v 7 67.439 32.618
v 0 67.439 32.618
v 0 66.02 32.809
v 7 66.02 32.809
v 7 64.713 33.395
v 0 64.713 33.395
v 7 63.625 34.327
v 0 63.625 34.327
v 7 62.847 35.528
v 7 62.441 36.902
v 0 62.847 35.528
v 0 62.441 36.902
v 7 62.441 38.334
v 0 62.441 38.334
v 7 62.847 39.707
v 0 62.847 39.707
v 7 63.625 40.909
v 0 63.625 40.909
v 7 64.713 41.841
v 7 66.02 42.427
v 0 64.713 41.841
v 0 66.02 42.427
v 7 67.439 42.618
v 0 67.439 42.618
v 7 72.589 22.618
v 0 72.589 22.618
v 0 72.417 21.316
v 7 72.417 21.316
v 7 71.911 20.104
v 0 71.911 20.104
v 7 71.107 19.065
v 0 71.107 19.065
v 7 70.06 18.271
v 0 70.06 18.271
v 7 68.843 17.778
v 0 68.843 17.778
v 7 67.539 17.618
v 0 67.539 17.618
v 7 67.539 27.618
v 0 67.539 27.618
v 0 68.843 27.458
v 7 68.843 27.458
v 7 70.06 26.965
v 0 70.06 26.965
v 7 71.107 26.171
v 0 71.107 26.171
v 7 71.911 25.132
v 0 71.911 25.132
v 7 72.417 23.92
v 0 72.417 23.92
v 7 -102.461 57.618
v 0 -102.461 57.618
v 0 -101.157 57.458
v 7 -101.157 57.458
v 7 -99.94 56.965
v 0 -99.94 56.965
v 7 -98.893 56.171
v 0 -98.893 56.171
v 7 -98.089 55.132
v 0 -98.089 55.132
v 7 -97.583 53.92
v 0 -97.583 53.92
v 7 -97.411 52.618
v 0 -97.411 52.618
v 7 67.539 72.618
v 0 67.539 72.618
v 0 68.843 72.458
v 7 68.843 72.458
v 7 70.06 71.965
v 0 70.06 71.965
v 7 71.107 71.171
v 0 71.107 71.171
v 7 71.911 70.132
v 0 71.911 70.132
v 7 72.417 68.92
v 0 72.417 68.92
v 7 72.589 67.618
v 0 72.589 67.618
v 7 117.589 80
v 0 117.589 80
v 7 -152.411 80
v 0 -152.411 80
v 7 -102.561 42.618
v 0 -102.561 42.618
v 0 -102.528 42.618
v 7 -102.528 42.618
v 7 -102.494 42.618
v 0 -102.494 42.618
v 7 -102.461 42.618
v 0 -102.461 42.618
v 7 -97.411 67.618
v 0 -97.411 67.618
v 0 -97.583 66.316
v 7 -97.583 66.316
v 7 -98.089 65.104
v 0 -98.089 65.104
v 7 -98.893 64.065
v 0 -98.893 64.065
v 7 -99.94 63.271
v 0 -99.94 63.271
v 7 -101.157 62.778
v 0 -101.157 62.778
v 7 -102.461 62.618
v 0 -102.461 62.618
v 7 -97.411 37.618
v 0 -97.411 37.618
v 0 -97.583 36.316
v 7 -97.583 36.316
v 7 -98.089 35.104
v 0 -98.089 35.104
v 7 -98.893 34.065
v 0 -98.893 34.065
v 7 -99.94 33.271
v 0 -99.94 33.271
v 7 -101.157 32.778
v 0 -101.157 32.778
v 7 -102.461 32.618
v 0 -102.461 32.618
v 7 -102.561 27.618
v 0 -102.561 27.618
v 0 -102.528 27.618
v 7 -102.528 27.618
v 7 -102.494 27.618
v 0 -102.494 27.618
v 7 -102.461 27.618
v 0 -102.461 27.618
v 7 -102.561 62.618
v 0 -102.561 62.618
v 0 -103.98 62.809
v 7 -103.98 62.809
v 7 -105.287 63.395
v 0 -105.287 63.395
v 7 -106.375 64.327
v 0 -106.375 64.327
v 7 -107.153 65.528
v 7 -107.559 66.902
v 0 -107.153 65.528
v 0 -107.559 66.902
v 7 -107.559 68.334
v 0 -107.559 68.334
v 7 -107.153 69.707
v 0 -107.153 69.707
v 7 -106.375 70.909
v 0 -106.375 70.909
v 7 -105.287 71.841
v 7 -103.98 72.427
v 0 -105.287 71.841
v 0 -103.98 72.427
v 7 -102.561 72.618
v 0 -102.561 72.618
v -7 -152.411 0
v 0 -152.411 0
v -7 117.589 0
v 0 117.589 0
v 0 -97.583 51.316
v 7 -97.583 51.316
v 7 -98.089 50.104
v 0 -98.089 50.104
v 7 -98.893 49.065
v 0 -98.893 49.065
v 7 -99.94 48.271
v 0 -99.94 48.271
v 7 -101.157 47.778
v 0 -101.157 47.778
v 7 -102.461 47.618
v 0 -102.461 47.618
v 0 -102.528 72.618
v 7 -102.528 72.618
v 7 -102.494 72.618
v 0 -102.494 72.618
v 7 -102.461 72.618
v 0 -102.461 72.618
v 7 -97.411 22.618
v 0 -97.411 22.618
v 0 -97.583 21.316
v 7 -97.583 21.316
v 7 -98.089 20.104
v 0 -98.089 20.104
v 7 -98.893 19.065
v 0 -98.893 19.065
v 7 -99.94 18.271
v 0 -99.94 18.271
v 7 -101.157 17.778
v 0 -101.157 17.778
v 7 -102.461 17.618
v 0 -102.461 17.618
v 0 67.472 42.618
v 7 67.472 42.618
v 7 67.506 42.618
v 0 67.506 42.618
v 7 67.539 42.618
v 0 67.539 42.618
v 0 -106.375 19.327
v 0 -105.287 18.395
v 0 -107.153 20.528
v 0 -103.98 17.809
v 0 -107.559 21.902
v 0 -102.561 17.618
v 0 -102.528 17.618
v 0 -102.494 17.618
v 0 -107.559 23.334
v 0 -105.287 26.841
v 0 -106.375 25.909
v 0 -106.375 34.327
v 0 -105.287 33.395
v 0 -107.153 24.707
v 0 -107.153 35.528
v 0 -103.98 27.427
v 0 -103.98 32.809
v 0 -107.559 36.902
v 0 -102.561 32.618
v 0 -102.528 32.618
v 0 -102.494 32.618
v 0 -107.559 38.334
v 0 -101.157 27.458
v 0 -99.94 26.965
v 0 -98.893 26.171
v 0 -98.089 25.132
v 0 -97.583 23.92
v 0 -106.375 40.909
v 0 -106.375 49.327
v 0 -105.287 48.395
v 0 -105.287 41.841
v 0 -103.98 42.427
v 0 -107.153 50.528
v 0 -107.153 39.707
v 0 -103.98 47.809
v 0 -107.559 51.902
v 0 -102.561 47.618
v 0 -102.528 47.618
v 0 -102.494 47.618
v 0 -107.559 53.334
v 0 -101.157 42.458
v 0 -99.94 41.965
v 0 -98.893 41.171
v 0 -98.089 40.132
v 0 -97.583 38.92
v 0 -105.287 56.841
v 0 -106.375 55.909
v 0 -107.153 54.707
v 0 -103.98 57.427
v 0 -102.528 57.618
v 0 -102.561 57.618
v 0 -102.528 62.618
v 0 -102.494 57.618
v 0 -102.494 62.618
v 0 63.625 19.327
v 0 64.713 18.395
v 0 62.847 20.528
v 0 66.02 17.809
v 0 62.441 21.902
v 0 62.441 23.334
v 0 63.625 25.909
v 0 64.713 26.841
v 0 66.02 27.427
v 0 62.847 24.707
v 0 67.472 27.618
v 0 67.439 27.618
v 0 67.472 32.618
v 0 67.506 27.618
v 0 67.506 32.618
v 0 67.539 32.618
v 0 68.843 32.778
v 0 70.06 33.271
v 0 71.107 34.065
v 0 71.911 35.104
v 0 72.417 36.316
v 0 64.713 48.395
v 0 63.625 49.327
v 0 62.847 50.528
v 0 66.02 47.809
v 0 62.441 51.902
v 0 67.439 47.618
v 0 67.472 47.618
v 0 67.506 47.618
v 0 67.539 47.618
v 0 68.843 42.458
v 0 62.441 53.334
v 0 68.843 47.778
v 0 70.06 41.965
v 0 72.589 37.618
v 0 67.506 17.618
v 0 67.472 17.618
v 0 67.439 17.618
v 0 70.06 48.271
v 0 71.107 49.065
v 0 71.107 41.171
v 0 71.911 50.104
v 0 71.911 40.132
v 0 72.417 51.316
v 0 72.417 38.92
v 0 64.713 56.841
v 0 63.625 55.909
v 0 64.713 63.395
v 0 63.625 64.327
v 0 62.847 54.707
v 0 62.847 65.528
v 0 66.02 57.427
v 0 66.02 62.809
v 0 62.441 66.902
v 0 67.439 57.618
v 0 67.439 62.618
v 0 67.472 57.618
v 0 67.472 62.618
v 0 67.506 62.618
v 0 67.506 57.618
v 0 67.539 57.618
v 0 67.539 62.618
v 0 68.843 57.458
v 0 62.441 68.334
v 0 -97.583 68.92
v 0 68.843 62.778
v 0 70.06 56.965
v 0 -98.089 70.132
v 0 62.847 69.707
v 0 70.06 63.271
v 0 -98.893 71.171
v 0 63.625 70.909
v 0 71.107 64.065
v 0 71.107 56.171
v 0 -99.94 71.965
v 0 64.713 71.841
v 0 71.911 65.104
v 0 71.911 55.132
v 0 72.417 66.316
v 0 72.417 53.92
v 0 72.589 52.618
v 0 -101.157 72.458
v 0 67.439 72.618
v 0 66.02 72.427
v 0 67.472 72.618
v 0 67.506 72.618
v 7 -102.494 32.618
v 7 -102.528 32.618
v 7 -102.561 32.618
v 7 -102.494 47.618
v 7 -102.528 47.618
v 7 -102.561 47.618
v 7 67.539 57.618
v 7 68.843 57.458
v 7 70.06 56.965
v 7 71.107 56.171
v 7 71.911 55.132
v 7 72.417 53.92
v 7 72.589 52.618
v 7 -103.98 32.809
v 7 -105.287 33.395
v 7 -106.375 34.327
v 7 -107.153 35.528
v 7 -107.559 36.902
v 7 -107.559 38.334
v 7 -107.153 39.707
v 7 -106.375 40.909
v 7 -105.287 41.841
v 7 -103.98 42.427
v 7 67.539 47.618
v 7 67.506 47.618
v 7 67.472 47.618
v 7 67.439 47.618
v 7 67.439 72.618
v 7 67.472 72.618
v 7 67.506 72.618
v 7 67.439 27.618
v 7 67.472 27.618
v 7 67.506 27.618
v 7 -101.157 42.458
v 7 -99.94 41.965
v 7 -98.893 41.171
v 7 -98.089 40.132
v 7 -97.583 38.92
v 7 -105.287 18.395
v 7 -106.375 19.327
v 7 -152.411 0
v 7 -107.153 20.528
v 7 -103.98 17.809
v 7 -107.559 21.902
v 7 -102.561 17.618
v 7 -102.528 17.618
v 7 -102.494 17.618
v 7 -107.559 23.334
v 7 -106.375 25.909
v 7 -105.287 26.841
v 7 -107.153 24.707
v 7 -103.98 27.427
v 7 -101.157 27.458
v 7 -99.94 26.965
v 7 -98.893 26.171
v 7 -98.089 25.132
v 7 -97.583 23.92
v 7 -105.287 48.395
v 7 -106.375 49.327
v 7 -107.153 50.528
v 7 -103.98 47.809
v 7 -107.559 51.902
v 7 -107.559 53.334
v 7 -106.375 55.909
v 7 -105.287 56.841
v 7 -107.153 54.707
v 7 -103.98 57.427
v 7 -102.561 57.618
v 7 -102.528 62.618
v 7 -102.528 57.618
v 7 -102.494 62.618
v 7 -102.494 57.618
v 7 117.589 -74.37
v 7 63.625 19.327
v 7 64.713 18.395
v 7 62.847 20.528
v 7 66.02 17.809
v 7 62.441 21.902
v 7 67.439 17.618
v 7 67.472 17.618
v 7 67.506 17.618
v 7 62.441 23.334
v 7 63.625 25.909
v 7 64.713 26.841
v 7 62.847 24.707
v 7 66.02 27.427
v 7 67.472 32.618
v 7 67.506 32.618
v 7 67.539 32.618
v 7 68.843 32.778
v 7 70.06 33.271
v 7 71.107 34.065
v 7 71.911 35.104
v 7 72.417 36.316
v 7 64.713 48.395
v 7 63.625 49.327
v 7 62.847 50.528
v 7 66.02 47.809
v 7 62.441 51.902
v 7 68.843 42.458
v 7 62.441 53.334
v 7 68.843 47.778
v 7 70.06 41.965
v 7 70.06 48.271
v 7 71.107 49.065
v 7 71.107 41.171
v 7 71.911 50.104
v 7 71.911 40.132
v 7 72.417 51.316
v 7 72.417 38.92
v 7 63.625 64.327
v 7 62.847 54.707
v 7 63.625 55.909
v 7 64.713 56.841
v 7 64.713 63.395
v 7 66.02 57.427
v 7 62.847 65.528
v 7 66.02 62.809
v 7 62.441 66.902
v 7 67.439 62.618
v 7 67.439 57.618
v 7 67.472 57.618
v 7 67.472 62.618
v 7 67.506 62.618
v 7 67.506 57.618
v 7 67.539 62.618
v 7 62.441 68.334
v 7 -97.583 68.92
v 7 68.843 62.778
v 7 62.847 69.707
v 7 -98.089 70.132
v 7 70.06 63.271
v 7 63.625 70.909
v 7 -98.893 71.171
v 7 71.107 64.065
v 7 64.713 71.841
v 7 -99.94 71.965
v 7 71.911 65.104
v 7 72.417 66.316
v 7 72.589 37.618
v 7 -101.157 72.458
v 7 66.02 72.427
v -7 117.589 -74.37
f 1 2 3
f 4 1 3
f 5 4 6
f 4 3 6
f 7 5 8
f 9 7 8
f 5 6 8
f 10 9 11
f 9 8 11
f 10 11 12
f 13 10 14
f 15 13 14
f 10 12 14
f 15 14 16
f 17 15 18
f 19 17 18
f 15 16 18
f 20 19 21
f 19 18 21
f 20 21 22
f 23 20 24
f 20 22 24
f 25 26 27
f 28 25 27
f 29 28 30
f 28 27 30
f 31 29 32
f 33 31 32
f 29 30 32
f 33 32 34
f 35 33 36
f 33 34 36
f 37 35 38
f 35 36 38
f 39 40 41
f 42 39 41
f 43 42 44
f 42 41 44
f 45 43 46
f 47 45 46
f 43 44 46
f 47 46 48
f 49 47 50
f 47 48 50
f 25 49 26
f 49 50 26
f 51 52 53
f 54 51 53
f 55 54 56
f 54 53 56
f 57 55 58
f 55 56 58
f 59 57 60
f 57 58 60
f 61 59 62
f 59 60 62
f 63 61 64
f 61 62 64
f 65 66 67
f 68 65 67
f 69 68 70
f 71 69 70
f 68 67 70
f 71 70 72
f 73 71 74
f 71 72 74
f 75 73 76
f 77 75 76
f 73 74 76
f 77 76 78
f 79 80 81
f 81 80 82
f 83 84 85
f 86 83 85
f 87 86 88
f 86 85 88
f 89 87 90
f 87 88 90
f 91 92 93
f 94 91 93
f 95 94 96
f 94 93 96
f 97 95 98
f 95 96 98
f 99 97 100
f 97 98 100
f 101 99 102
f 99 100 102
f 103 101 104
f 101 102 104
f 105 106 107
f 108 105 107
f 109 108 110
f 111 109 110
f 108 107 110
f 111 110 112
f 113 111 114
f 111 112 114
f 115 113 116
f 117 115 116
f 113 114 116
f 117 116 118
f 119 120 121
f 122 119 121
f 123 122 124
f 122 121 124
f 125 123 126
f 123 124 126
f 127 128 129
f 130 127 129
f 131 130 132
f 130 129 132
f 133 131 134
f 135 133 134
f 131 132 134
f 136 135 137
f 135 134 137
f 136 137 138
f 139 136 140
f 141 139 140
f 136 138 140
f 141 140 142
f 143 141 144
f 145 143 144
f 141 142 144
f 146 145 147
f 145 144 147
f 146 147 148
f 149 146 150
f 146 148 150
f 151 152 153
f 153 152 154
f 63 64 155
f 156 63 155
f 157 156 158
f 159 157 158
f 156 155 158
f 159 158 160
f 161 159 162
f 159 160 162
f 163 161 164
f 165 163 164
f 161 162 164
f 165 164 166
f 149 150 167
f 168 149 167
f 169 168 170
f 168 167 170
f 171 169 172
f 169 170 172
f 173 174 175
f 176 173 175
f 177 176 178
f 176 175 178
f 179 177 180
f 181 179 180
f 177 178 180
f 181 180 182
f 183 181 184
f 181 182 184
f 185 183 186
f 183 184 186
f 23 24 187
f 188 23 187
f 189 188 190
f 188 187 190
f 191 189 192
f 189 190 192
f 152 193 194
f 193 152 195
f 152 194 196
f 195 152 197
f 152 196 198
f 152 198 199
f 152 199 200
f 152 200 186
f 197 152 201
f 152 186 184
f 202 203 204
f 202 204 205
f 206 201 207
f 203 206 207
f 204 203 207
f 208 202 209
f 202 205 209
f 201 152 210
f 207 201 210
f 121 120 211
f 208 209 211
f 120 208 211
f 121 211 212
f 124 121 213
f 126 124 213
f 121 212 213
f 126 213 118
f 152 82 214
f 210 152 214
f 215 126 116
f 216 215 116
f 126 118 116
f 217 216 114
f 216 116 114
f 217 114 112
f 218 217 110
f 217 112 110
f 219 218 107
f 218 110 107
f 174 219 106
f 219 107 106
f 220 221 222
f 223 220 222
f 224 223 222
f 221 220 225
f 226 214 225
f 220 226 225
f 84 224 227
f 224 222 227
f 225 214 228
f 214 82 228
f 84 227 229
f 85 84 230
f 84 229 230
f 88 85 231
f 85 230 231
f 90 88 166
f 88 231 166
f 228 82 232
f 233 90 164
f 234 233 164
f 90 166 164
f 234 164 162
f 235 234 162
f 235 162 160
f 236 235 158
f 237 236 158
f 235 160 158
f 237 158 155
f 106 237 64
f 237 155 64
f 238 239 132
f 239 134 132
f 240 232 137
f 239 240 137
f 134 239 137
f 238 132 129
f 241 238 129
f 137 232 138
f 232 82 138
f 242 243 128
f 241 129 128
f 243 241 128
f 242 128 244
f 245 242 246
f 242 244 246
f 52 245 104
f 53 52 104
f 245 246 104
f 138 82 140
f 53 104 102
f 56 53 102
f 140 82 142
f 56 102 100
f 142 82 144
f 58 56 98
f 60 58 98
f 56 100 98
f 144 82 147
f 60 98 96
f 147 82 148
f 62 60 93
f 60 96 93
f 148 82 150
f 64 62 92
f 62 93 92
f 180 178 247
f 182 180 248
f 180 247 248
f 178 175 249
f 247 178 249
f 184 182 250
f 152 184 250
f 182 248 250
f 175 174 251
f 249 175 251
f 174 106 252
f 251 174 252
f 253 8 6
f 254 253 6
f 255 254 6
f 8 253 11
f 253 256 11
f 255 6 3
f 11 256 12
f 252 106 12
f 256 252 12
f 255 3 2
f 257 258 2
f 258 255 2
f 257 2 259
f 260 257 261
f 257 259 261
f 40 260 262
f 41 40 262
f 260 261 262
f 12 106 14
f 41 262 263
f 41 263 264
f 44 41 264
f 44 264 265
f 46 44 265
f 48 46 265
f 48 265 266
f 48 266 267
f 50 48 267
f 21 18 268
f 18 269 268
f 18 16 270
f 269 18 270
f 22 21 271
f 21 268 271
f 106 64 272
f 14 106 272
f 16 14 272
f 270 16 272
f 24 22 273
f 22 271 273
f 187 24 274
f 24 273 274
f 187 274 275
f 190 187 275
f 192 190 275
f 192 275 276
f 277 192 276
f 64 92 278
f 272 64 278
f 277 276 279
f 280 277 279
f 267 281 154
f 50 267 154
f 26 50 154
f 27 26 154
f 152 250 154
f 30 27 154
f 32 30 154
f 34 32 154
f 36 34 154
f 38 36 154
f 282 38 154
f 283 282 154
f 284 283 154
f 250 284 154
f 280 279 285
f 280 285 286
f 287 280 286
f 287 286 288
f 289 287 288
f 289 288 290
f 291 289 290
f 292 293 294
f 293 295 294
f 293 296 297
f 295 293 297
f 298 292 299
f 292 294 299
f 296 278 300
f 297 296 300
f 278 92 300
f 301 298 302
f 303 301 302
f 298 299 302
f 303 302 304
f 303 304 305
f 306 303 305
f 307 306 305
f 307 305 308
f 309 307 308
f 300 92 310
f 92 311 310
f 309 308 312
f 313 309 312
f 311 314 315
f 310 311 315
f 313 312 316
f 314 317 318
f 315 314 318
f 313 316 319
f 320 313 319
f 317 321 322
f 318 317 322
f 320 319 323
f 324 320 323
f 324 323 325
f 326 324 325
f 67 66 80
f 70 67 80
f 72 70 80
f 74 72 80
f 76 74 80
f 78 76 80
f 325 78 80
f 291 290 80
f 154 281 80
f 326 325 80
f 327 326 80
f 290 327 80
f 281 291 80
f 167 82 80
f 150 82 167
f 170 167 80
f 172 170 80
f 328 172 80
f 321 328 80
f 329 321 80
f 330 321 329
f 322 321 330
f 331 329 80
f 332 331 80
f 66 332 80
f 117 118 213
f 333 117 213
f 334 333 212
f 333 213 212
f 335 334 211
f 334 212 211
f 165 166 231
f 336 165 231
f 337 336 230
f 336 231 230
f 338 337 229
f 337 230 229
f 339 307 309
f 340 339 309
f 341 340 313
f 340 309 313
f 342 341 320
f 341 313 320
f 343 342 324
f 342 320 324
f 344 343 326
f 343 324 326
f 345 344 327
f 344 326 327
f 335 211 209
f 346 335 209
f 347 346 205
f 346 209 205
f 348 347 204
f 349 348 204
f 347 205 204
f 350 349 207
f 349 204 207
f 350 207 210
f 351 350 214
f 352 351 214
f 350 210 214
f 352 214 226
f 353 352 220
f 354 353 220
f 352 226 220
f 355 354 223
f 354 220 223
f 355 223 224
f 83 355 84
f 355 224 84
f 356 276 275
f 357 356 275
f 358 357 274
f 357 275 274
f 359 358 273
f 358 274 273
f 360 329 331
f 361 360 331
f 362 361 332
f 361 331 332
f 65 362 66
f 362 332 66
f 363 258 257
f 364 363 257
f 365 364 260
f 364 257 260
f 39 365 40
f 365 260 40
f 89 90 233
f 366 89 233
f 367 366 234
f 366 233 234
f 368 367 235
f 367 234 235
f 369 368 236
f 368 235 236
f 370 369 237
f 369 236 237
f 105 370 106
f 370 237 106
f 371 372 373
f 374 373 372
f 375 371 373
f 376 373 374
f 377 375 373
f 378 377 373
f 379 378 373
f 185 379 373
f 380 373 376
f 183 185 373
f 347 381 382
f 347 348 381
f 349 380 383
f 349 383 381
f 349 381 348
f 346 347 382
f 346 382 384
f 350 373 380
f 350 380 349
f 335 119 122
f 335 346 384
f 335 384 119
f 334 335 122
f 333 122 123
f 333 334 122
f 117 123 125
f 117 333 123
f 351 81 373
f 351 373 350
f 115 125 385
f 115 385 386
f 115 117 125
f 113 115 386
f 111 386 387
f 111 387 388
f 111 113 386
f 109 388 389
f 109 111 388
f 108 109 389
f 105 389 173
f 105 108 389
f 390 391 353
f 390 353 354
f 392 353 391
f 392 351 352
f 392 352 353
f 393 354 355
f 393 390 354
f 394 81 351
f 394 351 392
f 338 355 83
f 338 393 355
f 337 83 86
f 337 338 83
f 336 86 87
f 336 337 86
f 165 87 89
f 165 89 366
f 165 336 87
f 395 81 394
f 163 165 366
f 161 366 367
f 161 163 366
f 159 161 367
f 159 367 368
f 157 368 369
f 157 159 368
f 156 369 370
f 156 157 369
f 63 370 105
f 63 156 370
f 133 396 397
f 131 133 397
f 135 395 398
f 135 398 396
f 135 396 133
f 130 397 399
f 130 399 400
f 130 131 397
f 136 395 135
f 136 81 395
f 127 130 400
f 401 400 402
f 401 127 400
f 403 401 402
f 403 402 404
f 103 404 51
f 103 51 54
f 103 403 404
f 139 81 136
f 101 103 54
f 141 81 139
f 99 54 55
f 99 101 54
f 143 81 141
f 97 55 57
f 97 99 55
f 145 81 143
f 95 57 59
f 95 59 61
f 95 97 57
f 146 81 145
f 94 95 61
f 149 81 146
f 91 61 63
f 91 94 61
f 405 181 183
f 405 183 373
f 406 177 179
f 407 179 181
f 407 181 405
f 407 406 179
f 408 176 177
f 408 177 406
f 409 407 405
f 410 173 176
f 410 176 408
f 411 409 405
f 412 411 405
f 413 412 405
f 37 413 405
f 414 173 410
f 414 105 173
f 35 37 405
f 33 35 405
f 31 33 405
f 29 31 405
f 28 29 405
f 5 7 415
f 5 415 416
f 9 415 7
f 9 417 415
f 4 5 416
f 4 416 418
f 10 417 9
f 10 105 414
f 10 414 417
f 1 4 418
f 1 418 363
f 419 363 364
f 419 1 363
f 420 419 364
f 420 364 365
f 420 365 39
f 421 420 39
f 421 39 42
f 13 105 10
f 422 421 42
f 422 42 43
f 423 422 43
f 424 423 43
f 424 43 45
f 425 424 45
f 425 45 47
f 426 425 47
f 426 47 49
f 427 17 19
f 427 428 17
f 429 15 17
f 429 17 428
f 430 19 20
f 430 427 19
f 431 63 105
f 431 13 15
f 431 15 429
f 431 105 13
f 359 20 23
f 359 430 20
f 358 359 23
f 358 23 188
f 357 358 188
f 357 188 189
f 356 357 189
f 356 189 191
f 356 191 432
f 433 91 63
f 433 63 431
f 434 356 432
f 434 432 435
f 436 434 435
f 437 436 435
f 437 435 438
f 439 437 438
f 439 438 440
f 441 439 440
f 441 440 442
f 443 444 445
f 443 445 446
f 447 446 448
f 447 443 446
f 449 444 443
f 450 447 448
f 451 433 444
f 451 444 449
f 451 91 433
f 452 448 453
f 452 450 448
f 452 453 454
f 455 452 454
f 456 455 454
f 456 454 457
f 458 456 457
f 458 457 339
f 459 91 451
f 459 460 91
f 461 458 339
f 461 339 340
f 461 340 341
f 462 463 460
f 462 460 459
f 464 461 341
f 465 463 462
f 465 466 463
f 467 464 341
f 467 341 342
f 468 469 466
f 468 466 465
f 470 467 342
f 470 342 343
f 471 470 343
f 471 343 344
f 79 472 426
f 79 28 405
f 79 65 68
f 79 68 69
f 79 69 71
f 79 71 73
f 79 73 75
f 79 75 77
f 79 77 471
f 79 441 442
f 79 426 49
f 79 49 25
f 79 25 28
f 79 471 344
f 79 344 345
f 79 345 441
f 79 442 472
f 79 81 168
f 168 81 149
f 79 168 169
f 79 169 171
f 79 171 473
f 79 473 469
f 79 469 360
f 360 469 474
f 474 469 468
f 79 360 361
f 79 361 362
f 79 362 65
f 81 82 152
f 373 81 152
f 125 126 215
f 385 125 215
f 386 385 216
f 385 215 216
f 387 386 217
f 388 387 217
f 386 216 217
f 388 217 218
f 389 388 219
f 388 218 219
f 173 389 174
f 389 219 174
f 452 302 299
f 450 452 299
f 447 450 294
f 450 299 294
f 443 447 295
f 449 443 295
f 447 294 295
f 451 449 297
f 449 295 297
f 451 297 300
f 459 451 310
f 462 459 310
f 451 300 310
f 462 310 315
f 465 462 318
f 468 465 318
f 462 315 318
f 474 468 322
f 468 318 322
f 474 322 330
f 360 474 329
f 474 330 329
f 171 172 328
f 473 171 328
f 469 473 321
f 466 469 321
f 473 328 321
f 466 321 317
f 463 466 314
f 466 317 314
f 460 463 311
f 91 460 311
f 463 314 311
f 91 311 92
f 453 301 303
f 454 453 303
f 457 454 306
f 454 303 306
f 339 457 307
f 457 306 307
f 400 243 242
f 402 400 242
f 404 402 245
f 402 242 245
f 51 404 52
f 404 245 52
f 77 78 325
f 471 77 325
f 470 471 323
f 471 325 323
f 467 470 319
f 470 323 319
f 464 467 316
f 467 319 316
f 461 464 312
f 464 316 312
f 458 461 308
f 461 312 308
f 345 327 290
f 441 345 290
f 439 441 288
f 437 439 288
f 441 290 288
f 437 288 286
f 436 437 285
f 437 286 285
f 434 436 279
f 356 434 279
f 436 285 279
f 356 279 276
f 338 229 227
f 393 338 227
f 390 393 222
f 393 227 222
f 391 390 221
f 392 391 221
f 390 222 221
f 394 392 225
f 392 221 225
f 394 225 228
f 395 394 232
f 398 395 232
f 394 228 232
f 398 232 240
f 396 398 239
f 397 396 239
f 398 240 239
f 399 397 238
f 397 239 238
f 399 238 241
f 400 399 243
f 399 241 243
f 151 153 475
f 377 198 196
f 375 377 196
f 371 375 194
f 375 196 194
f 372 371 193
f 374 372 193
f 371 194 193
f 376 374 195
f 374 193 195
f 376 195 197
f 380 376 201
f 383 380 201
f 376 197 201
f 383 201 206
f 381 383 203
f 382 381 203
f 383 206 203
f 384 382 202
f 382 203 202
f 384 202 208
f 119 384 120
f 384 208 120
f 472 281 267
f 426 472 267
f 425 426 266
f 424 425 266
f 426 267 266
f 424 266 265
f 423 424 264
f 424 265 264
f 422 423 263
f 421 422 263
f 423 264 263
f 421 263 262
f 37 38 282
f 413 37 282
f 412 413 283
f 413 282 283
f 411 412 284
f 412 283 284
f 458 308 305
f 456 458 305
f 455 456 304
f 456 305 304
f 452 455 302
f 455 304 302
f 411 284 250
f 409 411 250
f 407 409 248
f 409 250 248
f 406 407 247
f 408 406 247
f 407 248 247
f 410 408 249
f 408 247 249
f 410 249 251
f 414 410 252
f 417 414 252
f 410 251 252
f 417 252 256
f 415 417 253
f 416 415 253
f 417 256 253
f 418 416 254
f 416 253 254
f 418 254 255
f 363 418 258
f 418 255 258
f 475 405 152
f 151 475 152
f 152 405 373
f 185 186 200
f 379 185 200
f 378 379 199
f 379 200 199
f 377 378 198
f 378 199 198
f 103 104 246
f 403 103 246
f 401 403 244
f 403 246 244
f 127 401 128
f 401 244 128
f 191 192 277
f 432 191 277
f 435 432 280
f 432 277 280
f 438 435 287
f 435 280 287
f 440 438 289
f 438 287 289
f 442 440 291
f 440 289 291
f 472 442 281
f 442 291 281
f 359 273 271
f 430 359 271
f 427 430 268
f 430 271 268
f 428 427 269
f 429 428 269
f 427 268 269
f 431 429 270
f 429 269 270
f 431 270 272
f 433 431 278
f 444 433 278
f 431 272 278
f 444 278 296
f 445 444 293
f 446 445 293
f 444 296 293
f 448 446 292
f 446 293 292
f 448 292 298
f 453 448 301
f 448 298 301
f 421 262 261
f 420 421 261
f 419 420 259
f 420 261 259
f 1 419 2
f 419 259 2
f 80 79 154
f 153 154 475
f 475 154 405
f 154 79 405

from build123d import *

# Parameters (mm, degrees)
F1_DEPTH = 7
F3_DEPTH = 7


# Not quite as in the source:
# - a feature names something its author has since deleted; it is built from what else it names


with BuildPart() as f1:
    # F0 (on Right) → F1 (new body)
    with BuildSketch(Plane.YZ):
        Polygon((-102.4108821703, 80), (-152.4108821703, 80), (-152.4108821703, 0), (117.5891178297, 0), (117.5891178297, 80), (67.5891178297, 80), align=None)
        with BuildLine():
            ThreePointArc((-102.4608821703, 27.6177177185), (-98.8930703505, 26.1711353257), (-97.4108821703, 22.6179677248))
            ThreePointArc((-97.4108821703, 22.6179677248), (-98.8930703505, 19.0648001239), (-102.4608821703, 17.6182177311))
            ThreePointArc((-102.4608821703, 17.6182177311), (-102.5108821703, 17.6179677248), (-102.5608821703, 17.6182177311))
            ThreePointArc((-102.5608821703, 17.6182177311), (-107.6108821703, 22.6179677248), (-102.5608821703, 27.6177177185))
            ThreePointArc((-102.5608821703, 27.6177177185), (-102.5108821703, 27.6179677248), (-102.4608821703, 27.6177177185))
        make_face(mode=Mode.SUBTRACT)
        with BuildLine():
            ThreePointArc((-102.4608821703, 42.6177177185), (-98.8930703505, 41.1711353257), (-97.4108821703, 37.6179677248))
            ThreePointArc((-97.4108821703, 37.6179677248), (-98.8930703505, 34.0648001239), (-102.4608821703, 32.6182177311))
            ThreePointArc((-102.4608821703, 32.6182177311), (-102.5108821703, 32.6179677248), (-102.5608821703, 32.6182177311))
            ThreePointArc((-102.5608821703, 32.6182177311), (-107.6108821703, 37.6179677248), (-102.5608821703, 42.6177177185))
            ThreePointArc((-102.5608821703, 42.6177177185), (-102.5108821703, 42.6179677248), (-102.4608821703, 42.6177177185))
        make_face(mode=Mode.SUBTRACT)
        with BuildLine():
            ThreePointArc((-102.4608821703, 57.6177177185), (-98.8930703505, 56.1711353257), (-97.4108821703, 52.6179677248))
            ThreePointArc((-97.4108821703, 52.6179677248), (-98.8930703505, 49.0648001239), (-102.4608821703, 47.6182177311))
            ThreePointArc((-102.4608821703, 47.6182177311), (-102.5108821703, 47.6179677248), (-102.5608821703, 47.6182177311))
            ThreePointArc((-102.5608821703, 47.6182177311), (-107.6108821703, 52.6179677248), (-102.5608821703, 57.6177177185))
            ThreePointArc((-102.5608821703, 57.6177177185), (-102.5108821703, 57.6179677248), (-102.4608821703, 57.6177177185))
        make_face(mode=Mode.SUBTRACT)
        with BuildLine():
            ThreePointArc((-102.4608821703, 72.6177177185), (-98.8930703505, 71.1711353257), (-97.4108821703, 67.6179677248))
            ThreePointArc((-97.4108821703, 67.6179677248), (-98.8930703505, 64.0648001239), (-102.4608821703, 62.6182177311))
            ThreePointArc((-102.4608821703, 62.6182177311), (-102.5108821703, 62.6179677248), (-102.5608821703, 62.6182177311))
            ThreePointArc((-102.5608821703, 62.6182177311), (-107.6108821703, 67.6179677248), (-102.5608821703, 72.6177177185))
            ThreePointArc((-102.5608821703, 72.6177177185), (-102.5108821703, 72.6179677248), (-102.4608821703, 72.6177177185))
        make_face(mode=Mode.SUBTRACT)
        with BuildLine():
            ThreePointArc((67.5391178297, 27.6177177185), (71.1069296495, 26.1711353257), (72.5891178297, 22.6179677248))
            ThreePointArc((72.5891178297, 22.6179677248), (71.1069296495, 19.0648001239), (67.5391178297, 17.6182177311))
            ThreePointArc((67.5391178297, 17.6182177311), (67.4891178297, 17.6179677248), (67.4391178297, 17.6182177311))
            ThreePointArc((67.4391178297, 17.6182177311), (62.3891178297, 22.6179677248), (67.4391178297, 27.6177177185))
            ThreePointArc((67.4391178297, 27.6177177185), (67.4891178297, 27.6179677248), (67.5391178297, 27.6177177185))
        make_face(mode=Mode.SUBTRACT)
        with BuildLine():
            ThreePointArc((67.5391178297, 42.6177177185), (71.1069296495, 41.1711353257), (72.5891178297, 37.6179677248))
            ThreePointArc((72.5891178297, 37.6179677248), (71.1069296495, 34.0648001239), (67.5391178297, 32.6182177311))
            ThreePointArc((67.5391178297, 32.6182177311), (67.4891178297, 32.6179677248), (67.4391178297, 32.6182177311))
            ThreePointArc((67.4391178297, 32.6182177311), (62.3891178297, 37.6179677248), (67.4391178297, 42.6177177185))
            ThreePointArc((67.4391178297, 42.6177177185), (67.4891178297, 42.6179677248), (67.5391178297, 42.6177177185))
        make_face(mode=Mode.SUBTRACT)
        with BuildLine():
            ThreePointArc((67.5391178297, 57.6177177185), (71.1069296495, 56.1711353257), (72.5891178297, 52.6179677248))
            ThreePointArc((72.5891178297, 52.6179677248), (71.1069296495, 49.0648001239), (67.5391178297, 47.6182177311))
            ThreePointArc((67.5391178297, 47.6182177311), (67.4891178297, 47.6179677248), (67.4391178297, 47.6182177311))
            ThreePointArc((67.4391178297, 47.6182177311), (62.3891178297, 52.6179677248), (67.4391178297, 57.6177177185))
            ThreePointArc((67.4391178297, 57.6177177185), (67.4891178297, 57.6179677248), (67.5391178297, 57.6177177185))
        make_face(mode=Mode.SUBTRACT)
        with BuildLine():
            ThreePointArc((67.5391178297, 72.6177177185), (71.1069296495, 71.1711353257), (72.5891178297, 67.6179677248))
            ThreePointArc((72.5891178297, 67.6179677248), (71.1069296495, 64.0648001239), (67.5391178297, 62.6182177311))
            ThreePointArc((67.5391178297, 62.6182177311), (67.4891178297, 62.6179677248), (67.4391178297, 62.6182177311))
            ThreePointArc((67.4391178297, 62.6182177311), (62.3891178297, 67.6179677248), (67.4391178297, 72.6177177185))
            ThreePointArc((67.4391178297, 72.6177177185), (67.4891178297, 72.6179677248), (67.5391178297, 72.6177177185))
        make_face(mode=Mode.SUBTRACT)
        Polygon((117.5891178297, 0), (-152.4108821703, 0), (117.5891178297, -74.3703905304), align=None)
    extrude(amount=F1_DEPTH)

    # F2 (on face) → F3 (join)
    with BuildSketch(Plane(origin=(0, 0, 0), x_dir=(0, -1, 0), z_dir=(-1, 0, 0))):
        Polygon((-117.5891178297, -74.3703905304), (152.4108821703, 0), (-117.5891178297, 0), align=None)
    extrude(amount=F3_DEPTH)


solid = f1.part
